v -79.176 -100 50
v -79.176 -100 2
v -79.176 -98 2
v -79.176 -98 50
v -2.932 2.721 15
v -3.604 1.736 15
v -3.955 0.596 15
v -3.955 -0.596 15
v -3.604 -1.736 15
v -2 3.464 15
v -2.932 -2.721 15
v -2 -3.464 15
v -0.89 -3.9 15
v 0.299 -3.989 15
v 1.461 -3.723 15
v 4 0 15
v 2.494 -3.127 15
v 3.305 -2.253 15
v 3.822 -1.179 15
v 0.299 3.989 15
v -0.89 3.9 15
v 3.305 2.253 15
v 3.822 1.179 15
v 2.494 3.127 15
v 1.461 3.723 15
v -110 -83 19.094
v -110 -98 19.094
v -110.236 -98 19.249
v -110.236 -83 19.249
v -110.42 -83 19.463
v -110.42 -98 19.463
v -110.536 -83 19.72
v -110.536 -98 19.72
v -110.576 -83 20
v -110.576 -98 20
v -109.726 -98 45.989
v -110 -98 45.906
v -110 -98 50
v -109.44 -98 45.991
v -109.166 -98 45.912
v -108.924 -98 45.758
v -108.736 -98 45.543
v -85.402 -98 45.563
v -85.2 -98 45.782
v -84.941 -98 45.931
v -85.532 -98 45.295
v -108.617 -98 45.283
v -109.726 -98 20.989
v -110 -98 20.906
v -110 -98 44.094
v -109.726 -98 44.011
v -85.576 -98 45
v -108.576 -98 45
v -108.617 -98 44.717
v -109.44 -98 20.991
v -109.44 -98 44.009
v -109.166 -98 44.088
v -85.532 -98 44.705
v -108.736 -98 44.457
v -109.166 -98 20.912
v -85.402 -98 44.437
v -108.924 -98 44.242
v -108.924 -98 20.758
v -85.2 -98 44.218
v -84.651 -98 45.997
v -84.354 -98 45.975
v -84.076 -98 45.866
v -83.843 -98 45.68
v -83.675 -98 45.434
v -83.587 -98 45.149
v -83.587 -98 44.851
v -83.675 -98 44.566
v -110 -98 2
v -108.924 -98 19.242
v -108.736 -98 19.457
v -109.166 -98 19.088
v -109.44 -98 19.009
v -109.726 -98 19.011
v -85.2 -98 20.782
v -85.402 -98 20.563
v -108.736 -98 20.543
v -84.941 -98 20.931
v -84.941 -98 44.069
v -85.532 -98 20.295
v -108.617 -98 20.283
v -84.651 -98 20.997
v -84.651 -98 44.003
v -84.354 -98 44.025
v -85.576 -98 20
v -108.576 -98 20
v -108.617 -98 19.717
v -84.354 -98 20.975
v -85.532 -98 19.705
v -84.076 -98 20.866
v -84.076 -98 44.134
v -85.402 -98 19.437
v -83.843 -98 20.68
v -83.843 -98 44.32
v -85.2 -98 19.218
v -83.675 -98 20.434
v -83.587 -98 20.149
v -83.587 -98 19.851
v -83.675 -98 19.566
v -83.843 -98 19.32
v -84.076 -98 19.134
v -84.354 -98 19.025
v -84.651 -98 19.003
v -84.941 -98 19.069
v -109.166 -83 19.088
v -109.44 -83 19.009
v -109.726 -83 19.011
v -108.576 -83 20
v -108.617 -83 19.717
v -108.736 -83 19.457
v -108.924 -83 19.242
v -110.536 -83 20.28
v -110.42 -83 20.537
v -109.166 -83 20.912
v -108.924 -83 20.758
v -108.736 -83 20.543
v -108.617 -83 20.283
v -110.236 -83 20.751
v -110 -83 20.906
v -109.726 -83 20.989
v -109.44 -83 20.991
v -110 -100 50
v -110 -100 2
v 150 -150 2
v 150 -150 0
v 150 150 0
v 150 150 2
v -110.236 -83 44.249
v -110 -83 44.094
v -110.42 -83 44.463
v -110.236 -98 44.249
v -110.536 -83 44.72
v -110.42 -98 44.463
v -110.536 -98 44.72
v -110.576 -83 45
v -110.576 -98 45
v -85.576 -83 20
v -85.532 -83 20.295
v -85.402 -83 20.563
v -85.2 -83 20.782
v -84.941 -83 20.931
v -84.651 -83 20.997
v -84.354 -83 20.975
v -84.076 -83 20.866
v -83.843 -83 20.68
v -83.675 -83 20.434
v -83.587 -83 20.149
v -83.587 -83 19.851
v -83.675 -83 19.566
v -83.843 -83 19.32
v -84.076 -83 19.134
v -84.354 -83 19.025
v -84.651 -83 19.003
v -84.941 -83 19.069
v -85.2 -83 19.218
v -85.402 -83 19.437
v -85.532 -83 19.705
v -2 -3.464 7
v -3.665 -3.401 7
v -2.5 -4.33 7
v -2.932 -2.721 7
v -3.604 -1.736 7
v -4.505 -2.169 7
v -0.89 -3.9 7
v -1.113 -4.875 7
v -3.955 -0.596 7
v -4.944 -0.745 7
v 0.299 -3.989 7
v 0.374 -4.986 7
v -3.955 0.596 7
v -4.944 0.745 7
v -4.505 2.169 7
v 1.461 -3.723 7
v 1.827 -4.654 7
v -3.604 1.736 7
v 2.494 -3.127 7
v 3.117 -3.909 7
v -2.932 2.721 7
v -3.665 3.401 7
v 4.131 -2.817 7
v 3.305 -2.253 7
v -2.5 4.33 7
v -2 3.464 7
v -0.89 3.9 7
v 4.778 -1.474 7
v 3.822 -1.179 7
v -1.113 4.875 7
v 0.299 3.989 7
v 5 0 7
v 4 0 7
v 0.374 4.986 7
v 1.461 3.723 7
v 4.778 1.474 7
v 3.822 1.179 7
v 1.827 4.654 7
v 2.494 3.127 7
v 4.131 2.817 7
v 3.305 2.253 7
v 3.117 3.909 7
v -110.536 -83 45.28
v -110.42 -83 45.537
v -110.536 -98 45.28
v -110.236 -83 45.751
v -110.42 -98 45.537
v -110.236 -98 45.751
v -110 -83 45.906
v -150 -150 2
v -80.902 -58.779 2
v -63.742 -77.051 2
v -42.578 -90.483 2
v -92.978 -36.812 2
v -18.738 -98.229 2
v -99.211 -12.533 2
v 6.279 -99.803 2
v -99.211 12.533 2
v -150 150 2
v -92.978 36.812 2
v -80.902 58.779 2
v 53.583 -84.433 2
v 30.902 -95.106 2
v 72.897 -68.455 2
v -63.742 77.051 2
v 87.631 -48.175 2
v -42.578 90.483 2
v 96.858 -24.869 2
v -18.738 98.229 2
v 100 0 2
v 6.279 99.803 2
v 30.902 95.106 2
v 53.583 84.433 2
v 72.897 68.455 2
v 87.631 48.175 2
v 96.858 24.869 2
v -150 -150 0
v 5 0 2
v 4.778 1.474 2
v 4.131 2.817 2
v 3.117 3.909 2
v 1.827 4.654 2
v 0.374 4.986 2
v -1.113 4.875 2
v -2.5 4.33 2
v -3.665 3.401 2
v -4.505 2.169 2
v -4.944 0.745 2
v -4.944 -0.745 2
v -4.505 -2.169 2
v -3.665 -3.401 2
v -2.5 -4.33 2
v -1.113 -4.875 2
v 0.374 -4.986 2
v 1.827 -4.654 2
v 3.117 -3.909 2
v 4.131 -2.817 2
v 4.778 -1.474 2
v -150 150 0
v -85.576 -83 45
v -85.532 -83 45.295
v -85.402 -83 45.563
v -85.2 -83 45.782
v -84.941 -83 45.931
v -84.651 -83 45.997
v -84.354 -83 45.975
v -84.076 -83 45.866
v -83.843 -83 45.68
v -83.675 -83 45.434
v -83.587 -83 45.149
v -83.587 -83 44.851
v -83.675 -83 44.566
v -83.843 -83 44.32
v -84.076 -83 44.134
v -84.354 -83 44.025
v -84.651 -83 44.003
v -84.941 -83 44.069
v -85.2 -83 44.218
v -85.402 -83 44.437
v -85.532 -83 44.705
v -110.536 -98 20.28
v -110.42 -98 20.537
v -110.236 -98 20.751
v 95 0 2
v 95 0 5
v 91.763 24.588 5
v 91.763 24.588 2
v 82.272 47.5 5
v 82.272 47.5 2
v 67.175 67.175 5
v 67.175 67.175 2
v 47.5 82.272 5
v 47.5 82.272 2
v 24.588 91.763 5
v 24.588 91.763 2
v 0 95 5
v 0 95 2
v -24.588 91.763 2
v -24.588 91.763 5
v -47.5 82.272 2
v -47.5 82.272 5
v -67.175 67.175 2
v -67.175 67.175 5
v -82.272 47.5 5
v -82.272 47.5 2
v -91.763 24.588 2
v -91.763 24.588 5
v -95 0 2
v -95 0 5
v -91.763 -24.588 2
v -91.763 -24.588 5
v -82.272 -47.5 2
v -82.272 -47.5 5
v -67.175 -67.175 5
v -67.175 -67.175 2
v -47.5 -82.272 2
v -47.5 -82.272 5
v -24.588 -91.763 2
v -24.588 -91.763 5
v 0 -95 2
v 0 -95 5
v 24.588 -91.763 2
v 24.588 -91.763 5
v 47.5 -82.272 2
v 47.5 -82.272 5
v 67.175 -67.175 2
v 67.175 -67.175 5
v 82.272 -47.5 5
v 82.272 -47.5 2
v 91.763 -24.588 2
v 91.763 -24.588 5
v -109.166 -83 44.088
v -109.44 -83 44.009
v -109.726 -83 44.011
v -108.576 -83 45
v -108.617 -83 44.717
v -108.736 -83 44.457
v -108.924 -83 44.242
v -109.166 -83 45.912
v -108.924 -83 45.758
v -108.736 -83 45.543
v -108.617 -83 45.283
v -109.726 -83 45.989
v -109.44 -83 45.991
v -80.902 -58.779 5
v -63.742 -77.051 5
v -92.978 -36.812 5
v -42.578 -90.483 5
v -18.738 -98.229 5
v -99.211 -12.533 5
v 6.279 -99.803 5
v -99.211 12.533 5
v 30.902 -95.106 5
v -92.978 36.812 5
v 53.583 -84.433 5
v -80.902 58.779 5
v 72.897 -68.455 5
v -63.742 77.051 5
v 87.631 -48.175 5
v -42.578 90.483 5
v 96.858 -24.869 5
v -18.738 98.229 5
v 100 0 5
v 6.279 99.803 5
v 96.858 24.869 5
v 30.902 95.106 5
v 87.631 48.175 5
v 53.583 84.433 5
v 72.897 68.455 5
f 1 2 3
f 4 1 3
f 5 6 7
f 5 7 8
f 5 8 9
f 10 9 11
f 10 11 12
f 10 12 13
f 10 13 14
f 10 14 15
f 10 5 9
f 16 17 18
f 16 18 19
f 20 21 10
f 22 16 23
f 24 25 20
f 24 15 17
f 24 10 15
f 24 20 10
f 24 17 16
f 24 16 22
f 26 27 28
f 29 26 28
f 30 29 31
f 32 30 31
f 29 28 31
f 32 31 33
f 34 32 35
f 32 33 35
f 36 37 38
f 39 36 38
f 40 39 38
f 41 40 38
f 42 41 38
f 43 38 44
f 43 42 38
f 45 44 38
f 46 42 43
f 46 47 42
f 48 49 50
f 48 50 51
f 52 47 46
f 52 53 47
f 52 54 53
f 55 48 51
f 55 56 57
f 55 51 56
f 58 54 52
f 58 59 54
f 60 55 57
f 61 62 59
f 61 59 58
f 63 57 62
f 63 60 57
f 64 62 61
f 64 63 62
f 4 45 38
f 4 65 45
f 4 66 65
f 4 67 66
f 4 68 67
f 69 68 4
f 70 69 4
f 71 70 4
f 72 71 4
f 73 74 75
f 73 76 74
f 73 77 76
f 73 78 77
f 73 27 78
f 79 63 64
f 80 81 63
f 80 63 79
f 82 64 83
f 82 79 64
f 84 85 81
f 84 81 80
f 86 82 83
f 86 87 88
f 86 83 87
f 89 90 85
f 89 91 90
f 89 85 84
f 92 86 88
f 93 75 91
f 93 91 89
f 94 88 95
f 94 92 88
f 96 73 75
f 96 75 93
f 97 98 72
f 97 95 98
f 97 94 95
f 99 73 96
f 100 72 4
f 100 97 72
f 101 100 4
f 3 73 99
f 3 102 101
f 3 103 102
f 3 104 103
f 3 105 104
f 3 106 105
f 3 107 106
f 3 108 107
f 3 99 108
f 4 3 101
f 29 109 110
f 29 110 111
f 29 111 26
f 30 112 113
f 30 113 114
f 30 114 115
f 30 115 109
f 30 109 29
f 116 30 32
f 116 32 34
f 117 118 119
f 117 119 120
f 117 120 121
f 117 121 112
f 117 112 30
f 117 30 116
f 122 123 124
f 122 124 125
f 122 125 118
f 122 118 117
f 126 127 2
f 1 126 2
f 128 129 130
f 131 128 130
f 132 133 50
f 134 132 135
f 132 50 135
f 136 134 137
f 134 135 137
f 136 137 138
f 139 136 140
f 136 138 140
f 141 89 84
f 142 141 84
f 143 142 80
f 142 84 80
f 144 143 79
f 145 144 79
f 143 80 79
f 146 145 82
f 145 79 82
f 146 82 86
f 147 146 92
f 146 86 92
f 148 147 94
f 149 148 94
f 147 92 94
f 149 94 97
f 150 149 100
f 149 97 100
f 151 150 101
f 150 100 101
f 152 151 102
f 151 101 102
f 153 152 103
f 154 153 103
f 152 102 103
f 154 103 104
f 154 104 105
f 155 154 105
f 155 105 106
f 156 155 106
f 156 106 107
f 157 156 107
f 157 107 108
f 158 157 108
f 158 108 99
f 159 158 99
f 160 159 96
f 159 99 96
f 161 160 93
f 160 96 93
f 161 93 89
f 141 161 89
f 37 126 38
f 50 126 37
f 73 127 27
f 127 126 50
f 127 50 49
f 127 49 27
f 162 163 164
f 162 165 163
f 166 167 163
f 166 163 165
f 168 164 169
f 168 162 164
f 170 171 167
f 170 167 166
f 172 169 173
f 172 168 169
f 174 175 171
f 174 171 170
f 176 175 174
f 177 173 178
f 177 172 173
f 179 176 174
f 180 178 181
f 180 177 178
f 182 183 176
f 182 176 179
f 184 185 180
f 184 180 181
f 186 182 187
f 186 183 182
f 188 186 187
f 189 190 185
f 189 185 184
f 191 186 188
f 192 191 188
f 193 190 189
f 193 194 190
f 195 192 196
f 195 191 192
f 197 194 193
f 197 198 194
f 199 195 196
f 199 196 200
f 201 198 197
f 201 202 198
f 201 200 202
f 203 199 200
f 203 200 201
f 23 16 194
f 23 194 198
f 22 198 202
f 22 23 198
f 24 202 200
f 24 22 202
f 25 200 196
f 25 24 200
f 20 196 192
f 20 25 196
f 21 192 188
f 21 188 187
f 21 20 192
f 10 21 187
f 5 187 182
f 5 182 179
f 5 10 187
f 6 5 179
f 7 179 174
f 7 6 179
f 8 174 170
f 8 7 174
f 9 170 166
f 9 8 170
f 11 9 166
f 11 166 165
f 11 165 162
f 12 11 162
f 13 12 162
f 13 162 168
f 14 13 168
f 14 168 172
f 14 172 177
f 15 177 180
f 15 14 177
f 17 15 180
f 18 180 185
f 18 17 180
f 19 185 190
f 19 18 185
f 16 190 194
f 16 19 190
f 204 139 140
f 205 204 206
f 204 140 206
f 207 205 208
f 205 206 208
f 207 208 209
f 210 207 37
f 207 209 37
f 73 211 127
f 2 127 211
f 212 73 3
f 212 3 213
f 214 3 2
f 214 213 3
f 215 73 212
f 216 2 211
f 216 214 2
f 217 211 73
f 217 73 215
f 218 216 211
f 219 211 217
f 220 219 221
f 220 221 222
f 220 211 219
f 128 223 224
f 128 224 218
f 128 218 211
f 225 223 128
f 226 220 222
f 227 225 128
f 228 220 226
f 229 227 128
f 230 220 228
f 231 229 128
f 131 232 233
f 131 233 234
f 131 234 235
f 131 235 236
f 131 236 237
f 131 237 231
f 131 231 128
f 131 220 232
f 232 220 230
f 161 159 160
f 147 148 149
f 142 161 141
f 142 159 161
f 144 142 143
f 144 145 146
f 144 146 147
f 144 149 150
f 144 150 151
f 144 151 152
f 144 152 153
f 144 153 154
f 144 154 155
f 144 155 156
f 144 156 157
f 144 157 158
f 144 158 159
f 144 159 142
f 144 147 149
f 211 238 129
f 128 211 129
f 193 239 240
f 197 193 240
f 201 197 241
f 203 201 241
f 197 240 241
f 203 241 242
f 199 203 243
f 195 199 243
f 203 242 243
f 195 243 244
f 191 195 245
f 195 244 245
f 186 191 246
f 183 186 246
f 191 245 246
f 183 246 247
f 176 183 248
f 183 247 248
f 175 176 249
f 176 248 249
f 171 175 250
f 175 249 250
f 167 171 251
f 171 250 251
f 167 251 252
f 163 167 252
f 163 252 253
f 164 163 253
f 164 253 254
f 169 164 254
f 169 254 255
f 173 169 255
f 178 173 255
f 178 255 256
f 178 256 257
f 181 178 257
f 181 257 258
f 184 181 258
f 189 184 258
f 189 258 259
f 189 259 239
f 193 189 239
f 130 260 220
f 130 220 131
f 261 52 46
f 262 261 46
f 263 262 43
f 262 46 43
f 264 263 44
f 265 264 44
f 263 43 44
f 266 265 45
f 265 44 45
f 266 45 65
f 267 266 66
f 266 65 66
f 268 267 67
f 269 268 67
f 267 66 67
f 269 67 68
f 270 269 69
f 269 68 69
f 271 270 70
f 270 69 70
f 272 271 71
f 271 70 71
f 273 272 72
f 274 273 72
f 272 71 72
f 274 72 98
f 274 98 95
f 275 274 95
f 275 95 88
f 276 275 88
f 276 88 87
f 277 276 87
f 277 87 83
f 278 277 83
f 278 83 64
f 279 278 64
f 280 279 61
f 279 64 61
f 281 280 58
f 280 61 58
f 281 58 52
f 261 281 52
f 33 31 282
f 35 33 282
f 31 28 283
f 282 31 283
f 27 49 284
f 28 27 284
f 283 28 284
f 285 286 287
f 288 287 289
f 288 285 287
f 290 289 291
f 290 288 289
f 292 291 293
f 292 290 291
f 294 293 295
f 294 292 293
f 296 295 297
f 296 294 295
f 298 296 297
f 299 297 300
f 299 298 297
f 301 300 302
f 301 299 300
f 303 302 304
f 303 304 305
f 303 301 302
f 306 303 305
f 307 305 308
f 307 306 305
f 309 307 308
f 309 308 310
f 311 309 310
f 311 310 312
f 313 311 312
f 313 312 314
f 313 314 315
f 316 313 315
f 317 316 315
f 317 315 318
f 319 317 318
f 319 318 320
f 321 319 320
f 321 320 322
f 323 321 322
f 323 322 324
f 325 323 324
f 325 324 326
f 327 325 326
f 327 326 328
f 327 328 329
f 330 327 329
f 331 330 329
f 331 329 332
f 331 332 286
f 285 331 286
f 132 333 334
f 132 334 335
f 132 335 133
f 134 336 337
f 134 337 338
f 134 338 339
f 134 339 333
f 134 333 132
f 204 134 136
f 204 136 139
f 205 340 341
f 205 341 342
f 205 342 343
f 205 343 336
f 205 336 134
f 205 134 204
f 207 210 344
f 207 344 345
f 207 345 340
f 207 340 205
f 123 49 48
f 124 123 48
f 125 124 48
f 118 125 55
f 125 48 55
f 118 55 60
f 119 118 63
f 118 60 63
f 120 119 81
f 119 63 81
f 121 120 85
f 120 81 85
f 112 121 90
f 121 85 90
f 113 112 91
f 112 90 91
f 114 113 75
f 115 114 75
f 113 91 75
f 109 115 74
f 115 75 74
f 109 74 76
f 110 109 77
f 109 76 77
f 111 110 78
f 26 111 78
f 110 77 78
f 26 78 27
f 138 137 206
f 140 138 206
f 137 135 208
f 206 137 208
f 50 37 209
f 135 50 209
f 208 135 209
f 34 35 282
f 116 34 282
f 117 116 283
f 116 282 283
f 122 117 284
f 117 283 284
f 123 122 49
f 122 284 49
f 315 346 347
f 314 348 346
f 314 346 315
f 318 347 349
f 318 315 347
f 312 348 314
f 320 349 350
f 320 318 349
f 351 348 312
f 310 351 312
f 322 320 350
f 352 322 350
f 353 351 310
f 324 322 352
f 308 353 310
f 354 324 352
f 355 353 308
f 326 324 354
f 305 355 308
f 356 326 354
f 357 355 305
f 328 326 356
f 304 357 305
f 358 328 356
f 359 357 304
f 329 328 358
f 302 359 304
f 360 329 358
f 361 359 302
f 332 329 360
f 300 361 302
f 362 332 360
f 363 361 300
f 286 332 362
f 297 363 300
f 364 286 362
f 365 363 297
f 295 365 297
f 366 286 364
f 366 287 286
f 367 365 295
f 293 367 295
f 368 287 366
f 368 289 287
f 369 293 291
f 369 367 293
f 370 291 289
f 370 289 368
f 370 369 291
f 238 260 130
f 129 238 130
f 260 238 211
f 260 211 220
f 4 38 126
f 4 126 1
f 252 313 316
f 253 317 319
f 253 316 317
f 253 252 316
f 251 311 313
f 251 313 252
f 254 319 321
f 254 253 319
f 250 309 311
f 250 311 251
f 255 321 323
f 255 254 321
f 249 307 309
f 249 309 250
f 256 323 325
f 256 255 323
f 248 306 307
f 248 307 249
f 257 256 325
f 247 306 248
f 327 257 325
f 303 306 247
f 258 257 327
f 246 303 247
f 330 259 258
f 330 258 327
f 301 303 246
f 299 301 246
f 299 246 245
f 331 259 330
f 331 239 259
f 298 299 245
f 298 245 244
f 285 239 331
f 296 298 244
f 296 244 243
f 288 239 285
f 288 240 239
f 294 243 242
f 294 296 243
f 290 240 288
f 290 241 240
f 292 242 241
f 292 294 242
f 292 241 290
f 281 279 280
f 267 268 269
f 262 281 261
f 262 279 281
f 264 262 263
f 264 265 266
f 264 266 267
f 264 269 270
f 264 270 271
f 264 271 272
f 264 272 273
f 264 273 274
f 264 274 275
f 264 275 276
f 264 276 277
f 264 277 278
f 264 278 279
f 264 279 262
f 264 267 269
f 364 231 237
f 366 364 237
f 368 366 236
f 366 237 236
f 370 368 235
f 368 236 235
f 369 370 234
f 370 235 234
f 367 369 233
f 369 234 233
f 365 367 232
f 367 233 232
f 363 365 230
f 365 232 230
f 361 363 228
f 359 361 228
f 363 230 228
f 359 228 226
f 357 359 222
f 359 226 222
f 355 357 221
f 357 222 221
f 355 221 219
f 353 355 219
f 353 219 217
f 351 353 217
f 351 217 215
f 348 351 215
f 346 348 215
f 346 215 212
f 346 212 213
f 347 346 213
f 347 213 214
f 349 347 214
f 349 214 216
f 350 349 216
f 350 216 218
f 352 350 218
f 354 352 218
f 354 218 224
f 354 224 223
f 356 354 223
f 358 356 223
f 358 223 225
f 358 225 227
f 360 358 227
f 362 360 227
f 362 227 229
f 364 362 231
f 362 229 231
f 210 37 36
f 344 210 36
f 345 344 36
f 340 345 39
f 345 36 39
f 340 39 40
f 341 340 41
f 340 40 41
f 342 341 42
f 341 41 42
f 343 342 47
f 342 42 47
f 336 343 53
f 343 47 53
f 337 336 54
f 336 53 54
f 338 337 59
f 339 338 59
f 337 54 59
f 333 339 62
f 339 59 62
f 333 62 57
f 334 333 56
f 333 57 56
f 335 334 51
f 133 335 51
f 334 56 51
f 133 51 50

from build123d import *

# Parameters (mm, degrees)
F0_W     = 300
F0_H     = 300
F0_W_2   = 30.8238497376
F0_H_2   = 2
F0_R     = 100
F0_R_2   = 94.9999988079
F0_R_3   = 5
F1_DEPTH = 2
F2_DEPTH = 15
F3_DEPTH = 5
F4_DEPTH = 50
F5_R     = 1
F6_DEPTH = 15
F7_R     = 5
F7_R_2   = 4
F8_DEPTH = 8


with BuildPart() as f1:
    # F0 (on Top) → F1 (new body)
    with BuildSketch(Plane.XY):
        Rectangle(F0_W, F0_H)
        with Locations((-94.5880751312, -99)):
            Rectangle(F0_W_2, F0_H_2, mode=Mode.SUBTRACT)
        Circle(F0_R, mode=Mode.SUBTRACT)
        Circle(F0_R)
        Circle(F0_R_2, mode=Mode.SUBTRACT)
        Circle(F0_R_2)
        Circle(F0_R_3, mode=Mode.SUBTRACT)
        with Locations((-94.5880751312, -99)):
            Rectangle(F0_W_2, F0_H_2)
    extrude(amount=F1_DEPTH)

    # F0 (on Top) → F2 (join)
    with BuildSketch(Plane.XY):
        Circle(F0_R_3)
    extrude(amount=F2_DEPTH)

    # F0 (on Top) → F3 (join)
    with BuildSketch(Plane.XY):
        Circle(F0_R)
        Circle(F0_R_2, mode=Mode.SUBTRACT)
    extrude(amount=F3_DEPTH)

    # F0 (on Top) → F4 (join)
    with BuildSketch(Plane.XY):
        with Locations((-94.5880751312, -99)):
            Rectangle(F0_W_2, F0_H_2)
    extrude(amount=F4_DEPTH)

    # F5 (on face) → F6 (join)
    with BuildSketch(Plane(origin=(0, -98, 0), x_dir=(-1, 0, 0), z_dir=(0, 1, 0))):
        with Locations((84.5761502624, 45)):
            Circle(F5_R)
        with BuildLine():
            Line((110, 44.0942674788), (110, 45.9057325212))
            ThreePointArc((110, 45.9057325212), (108.5761502624, 45), (110, 44.0942674788))
        make_face()
        with BuildLine():
            ThreePointArc((110, 44.0942674788), (110.4199066661, 44.4632736906), (110.5761502624, 45))
            ThreePointArc((110.5761502624, 45), (110.4199066661, 45.5367263094), (110, 45.9057325212))
            Line((110, 45.9057325212), (110, 44.0942674788))
        make_face()
        with BuildLine():
            Line((110, 19.0942674788), (110, 20.9057325212))
            ThreePointArc((110, 20.9057325212), (108.5761502624, 20), (110, 19.0942674788))
        make_face()
        with BuildLine():
            ThreePointArc((110.5761502624, 20), (110.4199066661, 20.5367263094), (110, 20.9057325212))
            Line((110, 20.9057325212), (110, 19.0942674788))
            ThreePointArc((110, 19.0942674788), (110.4199066661, 19.4632736906), (110.5761502624, 20))
        make_face()
        with Locations((84.5761502624, 20)):
            Circle(F5_R)
    extrude(amount=F6_DEPTH)

    # F7 (on face) → F8 (cut)
    with BuildSketch(Plane.XY.offset(15)):
        Circle(F7_R)
        Circle(F7_R_2, mode=Mode.SUBTRACT)
    extrude(amount=-F8_DEPTH, mode=Mode.SUBTRACT)


solid = f1.part
